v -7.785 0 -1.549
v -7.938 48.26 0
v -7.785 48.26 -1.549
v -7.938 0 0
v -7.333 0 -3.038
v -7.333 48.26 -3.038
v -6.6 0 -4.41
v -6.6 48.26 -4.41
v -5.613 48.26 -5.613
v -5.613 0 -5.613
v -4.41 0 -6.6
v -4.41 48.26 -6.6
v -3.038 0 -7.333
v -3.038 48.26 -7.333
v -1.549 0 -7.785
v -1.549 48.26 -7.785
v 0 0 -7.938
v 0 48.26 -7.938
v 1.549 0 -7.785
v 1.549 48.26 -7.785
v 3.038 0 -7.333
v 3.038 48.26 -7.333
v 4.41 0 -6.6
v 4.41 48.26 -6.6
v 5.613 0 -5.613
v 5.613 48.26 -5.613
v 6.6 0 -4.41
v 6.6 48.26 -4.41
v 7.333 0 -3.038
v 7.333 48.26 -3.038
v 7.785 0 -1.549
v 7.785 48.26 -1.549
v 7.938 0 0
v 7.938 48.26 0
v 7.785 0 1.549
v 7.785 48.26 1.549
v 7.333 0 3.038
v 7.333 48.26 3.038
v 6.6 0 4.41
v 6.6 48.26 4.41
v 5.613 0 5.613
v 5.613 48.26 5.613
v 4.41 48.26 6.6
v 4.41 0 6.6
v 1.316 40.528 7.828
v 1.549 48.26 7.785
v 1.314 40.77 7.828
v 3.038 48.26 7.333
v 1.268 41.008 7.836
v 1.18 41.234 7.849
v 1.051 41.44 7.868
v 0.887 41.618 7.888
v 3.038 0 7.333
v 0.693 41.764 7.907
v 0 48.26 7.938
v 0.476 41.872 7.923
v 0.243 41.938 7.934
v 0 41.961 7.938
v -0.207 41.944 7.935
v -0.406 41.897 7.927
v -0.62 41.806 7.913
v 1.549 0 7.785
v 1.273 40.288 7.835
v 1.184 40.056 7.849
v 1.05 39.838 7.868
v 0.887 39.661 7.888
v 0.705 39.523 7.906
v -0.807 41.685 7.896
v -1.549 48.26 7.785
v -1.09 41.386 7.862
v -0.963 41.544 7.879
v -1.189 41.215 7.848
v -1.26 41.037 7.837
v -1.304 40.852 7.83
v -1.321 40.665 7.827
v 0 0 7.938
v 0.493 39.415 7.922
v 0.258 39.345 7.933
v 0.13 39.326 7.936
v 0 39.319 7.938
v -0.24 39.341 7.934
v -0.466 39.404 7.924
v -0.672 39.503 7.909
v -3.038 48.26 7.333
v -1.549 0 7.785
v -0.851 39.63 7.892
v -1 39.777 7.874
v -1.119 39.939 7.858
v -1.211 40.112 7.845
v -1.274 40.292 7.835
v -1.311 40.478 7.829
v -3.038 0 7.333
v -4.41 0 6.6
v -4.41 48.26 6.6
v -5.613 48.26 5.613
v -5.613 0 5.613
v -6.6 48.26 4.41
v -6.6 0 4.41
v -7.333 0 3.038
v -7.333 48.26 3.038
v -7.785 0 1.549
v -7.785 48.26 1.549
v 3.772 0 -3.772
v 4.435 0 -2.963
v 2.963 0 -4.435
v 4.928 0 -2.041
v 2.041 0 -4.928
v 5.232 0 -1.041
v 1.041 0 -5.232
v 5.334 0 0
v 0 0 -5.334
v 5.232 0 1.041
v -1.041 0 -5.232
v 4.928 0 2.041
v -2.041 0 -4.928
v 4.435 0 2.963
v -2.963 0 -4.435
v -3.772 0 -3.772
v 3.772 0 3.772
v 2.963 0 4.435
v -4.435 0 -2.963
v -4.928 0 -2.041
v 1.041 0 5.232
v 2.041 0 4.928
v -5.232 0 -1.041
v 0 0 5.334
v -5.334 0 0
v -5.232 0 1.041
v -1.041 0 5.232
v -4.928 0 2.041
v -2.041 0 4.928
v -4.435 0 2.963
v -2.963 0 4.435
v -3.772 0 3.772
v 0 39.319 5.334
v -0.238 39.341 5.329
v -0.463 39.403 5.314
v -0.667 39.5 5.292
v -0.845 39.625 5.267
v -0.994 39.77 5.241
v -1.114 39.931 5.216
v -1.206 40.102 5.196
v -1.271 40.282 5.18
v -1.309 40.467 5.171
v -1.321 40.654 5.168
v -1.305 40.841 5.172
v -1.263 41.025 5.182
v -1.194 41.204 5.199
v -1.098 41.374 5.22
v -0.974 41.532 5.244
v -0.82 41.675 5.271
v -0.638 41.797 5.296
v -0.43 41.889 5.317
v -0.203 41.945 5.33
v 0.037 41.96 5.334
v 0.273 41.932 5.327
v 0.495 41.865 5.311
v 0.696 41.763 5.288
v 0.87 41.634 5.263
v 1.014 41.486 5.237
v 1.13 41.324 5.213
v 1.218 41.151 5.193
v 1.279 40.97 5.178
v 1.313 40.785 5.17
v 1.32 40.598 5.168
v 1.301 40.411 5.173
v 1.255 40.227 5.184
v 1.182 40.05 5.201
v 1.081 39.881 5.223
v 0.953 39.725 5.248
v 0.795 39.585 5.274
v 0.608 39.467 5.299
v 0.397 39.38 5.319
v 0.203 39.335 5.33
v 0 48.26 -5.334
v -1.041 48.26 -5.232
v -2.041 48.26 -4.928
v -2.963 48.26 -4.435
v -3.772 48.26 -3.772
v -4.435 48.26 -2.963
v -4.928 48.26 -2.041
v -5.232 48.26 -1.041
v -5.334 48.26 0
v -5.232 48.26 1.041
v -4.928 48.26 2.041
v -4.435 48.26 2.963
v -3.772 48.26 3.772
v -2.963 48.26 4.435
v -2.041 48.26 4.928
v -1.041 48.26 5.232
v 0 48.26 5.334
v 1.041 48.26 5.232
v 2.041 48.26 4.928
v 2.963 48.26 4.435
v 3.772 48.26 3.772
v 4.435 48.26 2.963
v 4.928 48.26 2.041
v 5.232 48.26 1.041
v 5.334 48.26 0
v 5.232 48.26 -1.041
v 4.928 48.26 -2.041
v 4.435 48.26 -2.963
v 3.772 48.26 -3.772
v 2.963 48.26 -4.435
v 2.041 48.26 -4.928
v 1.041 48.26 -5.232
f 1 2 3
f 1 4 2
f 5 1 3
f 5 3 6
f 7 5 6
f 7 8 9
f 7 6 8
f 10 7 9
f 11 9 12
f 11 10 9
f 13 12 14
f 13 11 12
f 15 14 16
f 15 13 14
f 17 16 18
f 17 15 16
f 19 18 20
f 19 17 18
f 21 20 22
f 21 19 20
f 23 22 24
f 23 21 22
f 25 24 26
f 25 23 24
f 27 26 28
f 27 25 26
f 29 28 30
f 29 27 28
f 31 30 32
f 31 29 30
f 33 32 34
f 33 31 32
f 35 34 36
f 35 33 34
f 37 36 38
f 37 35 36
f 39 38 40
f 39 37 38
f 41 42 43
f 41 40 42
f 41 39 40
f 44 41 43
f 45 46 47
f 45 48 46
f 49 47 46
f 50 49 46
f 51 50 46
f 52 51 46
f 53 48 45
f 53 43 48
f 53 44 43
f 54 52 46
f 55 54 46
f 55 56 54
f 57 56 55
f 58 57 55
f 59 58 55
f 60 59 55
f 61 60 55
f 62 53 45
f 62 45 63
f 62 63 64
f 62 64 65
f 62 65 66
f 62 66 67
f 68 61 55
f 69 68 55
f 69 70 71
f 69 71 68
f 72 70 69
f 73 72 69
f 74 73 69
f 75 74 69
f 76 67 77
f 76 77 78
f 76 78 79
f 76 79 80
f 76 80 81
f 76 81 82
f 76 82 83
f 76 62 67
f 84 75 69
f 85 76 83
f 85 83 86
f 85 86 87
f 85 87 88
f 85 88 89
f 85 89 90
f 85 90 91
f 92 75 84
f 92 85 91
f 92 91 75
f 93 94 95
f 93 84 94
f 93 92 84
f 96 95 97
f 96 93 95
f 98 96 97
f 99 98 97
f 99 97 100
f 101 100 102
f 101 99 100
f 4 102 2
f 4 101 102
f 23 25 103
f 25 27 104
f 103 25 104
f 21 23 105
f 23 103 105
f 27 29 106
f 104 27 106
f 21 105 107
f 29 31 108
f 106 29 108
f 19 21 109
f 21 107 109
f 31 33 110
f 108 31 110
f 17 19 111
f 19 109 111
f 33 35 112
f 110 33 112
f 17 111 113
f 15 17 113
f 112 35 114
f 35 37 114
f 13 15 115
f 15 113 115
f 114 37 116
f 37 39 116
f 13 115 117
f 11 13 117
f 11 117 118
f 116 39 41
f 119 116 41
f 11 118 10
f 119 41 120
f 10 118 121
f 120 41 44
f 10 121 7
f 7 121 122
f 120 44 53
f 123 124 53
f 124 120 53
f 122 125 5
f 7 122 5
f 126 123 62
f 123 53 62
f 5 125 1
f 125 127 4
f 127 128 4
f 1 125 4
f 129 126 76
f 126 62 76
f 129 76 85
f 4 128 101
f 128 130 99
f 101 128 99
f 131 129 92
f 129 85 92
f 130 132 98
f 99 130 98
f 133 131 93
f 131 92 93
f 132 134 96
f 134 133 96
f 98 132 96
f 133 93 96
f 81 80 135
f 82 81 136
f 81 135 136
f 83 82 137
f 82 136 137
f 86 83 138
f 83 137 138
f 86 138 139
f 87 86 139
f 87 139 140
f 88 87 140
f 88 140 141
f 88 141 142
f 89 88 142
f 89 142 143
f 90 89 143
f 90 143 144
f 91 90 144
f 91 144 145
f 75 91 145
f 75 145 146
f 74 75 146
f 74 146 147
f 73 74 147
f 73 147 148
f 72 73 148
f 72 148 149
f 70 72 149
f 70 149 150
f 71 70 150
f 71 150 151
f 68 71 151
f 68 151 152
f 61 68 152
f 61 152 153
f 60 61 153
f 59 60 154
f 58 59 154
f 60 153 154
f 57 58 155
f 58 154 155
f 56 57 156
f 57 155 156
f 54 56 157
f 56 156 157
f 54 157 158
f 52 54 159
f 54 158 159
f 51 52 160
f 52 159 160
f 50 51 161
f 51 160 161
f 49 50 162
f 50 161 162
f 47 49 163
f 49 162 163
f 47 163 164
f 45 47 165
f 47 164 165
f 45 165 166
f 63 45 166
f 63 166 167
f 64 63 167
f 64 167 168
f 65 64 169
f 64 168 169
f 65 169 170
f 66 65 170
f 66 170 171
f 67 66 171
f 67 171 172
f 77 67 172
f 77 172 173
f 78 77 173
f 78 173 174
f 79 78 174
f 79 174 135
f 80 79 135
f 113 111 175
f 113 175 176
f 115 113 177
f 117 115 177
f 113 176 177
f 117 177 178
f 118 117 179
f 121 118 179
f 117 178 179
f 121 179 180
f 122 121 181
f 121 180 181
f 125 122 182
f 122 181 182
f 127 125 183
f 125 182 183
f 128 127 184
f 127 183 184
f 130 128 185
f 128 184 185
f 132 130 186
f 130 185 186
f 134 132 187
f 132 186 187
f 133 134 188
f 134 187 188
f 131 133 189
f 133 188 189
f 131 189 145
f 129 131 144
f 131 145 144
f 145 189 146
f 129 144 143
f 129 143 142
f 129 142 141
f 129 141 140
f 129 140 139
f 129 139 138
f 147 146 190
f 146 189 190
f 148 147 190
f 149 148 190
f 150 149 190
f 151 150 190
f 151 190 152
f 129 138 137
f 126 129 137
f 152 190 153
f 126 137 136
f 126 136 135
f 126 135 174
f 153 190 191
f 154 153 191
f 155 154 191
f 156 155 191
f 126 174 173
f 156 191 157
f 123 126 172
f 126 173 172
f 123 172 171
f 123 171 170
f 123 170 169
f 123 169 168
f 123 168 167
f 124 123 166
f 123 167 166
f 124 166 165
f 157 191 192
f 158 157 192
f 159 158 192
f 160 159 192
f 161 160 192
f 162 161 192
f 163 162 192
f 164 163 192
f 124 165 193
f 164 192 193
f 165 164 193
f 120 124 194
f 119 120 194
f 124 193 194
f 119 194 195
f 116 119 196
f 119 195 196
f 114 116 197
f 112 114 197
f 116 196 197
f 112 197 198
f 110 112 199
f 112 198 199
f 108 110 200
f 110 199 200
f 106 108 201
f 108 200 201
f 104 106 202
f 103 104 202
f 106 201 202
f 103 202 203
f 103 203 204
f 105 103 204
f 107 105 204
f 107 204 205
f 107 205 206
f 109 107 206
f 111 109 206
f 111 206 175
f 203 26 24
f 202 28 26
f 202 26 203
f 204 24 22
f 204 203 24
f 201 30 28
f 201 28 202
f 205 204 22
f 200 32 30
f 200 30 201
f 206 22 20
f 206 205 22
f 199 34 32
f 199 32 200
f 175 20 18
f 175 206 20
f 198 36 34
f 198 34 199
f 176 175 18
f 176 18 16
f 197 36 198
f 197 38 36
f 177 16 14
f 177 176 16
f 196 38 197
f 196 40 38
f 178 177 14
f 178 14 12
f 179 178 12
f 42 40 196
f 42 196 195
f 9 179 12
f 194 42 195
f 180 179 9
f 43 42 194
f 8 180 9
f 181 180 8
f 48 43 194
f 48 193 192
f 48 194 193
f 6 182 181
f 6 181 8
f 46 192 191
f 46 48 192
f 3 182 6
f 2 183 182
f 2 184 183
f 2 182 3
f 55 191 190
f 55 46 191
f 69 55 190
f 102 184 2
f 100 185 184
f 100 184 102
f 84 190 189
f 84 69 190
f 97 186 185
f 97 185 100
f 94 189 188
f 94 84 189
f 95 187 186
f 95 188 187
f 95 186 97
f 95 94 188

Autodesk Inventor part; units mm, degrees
ref_plane "YZ Plane" through (0, 0, 0) normal (1, 0, 0) x (0, 1, 0)
ref_plane "XZ Plane" through (0, 0, 0) normal (0, 1, 0) x (-1, 0, 0)
sketch "Sketch1" plane through (0, 0, 0) normal (0, 1, 0) x (-1, 0, 0)
  circle A0 centre (0, 0) radius 7.9375
  dimension "d35" = 15.875
extrude "Extrusion1" add sketch "Sketch1" along normal blind 48.26
hole "Hole1" at (0, 0, 0) direction (0, 1, 0) diameter 10.668 end through all
ref_plane "Work Plane1" through (0, 0, 7.9375) normal (0, 0, 1) x (1, 0, 0)
sketch "Sketch2" plane through (0, 0, 7.9375) normal (0, 0, 1) x (1, 0, 0)
  line L0 (-7.9375, 0) -> (-7.9375, 48.26) projected
  line L1 (-7.9375, 0) -> (7.9375, 0) projected
  point P0 (0, 0)
  point P1 (0, 40.64)
  dimension "d11" = 40.64
hole "Hole2" at (0, 40.64, 7.9375) direction (0, 0, -1) diameter 2.6416 depth 7.62 tip angle 118 thread size "6-32 UNC" class "2B" standard "ANSI Unified Screw Threads"
properties part number "ToolHolderAdapter_v1" material "Aluminum 6061"
